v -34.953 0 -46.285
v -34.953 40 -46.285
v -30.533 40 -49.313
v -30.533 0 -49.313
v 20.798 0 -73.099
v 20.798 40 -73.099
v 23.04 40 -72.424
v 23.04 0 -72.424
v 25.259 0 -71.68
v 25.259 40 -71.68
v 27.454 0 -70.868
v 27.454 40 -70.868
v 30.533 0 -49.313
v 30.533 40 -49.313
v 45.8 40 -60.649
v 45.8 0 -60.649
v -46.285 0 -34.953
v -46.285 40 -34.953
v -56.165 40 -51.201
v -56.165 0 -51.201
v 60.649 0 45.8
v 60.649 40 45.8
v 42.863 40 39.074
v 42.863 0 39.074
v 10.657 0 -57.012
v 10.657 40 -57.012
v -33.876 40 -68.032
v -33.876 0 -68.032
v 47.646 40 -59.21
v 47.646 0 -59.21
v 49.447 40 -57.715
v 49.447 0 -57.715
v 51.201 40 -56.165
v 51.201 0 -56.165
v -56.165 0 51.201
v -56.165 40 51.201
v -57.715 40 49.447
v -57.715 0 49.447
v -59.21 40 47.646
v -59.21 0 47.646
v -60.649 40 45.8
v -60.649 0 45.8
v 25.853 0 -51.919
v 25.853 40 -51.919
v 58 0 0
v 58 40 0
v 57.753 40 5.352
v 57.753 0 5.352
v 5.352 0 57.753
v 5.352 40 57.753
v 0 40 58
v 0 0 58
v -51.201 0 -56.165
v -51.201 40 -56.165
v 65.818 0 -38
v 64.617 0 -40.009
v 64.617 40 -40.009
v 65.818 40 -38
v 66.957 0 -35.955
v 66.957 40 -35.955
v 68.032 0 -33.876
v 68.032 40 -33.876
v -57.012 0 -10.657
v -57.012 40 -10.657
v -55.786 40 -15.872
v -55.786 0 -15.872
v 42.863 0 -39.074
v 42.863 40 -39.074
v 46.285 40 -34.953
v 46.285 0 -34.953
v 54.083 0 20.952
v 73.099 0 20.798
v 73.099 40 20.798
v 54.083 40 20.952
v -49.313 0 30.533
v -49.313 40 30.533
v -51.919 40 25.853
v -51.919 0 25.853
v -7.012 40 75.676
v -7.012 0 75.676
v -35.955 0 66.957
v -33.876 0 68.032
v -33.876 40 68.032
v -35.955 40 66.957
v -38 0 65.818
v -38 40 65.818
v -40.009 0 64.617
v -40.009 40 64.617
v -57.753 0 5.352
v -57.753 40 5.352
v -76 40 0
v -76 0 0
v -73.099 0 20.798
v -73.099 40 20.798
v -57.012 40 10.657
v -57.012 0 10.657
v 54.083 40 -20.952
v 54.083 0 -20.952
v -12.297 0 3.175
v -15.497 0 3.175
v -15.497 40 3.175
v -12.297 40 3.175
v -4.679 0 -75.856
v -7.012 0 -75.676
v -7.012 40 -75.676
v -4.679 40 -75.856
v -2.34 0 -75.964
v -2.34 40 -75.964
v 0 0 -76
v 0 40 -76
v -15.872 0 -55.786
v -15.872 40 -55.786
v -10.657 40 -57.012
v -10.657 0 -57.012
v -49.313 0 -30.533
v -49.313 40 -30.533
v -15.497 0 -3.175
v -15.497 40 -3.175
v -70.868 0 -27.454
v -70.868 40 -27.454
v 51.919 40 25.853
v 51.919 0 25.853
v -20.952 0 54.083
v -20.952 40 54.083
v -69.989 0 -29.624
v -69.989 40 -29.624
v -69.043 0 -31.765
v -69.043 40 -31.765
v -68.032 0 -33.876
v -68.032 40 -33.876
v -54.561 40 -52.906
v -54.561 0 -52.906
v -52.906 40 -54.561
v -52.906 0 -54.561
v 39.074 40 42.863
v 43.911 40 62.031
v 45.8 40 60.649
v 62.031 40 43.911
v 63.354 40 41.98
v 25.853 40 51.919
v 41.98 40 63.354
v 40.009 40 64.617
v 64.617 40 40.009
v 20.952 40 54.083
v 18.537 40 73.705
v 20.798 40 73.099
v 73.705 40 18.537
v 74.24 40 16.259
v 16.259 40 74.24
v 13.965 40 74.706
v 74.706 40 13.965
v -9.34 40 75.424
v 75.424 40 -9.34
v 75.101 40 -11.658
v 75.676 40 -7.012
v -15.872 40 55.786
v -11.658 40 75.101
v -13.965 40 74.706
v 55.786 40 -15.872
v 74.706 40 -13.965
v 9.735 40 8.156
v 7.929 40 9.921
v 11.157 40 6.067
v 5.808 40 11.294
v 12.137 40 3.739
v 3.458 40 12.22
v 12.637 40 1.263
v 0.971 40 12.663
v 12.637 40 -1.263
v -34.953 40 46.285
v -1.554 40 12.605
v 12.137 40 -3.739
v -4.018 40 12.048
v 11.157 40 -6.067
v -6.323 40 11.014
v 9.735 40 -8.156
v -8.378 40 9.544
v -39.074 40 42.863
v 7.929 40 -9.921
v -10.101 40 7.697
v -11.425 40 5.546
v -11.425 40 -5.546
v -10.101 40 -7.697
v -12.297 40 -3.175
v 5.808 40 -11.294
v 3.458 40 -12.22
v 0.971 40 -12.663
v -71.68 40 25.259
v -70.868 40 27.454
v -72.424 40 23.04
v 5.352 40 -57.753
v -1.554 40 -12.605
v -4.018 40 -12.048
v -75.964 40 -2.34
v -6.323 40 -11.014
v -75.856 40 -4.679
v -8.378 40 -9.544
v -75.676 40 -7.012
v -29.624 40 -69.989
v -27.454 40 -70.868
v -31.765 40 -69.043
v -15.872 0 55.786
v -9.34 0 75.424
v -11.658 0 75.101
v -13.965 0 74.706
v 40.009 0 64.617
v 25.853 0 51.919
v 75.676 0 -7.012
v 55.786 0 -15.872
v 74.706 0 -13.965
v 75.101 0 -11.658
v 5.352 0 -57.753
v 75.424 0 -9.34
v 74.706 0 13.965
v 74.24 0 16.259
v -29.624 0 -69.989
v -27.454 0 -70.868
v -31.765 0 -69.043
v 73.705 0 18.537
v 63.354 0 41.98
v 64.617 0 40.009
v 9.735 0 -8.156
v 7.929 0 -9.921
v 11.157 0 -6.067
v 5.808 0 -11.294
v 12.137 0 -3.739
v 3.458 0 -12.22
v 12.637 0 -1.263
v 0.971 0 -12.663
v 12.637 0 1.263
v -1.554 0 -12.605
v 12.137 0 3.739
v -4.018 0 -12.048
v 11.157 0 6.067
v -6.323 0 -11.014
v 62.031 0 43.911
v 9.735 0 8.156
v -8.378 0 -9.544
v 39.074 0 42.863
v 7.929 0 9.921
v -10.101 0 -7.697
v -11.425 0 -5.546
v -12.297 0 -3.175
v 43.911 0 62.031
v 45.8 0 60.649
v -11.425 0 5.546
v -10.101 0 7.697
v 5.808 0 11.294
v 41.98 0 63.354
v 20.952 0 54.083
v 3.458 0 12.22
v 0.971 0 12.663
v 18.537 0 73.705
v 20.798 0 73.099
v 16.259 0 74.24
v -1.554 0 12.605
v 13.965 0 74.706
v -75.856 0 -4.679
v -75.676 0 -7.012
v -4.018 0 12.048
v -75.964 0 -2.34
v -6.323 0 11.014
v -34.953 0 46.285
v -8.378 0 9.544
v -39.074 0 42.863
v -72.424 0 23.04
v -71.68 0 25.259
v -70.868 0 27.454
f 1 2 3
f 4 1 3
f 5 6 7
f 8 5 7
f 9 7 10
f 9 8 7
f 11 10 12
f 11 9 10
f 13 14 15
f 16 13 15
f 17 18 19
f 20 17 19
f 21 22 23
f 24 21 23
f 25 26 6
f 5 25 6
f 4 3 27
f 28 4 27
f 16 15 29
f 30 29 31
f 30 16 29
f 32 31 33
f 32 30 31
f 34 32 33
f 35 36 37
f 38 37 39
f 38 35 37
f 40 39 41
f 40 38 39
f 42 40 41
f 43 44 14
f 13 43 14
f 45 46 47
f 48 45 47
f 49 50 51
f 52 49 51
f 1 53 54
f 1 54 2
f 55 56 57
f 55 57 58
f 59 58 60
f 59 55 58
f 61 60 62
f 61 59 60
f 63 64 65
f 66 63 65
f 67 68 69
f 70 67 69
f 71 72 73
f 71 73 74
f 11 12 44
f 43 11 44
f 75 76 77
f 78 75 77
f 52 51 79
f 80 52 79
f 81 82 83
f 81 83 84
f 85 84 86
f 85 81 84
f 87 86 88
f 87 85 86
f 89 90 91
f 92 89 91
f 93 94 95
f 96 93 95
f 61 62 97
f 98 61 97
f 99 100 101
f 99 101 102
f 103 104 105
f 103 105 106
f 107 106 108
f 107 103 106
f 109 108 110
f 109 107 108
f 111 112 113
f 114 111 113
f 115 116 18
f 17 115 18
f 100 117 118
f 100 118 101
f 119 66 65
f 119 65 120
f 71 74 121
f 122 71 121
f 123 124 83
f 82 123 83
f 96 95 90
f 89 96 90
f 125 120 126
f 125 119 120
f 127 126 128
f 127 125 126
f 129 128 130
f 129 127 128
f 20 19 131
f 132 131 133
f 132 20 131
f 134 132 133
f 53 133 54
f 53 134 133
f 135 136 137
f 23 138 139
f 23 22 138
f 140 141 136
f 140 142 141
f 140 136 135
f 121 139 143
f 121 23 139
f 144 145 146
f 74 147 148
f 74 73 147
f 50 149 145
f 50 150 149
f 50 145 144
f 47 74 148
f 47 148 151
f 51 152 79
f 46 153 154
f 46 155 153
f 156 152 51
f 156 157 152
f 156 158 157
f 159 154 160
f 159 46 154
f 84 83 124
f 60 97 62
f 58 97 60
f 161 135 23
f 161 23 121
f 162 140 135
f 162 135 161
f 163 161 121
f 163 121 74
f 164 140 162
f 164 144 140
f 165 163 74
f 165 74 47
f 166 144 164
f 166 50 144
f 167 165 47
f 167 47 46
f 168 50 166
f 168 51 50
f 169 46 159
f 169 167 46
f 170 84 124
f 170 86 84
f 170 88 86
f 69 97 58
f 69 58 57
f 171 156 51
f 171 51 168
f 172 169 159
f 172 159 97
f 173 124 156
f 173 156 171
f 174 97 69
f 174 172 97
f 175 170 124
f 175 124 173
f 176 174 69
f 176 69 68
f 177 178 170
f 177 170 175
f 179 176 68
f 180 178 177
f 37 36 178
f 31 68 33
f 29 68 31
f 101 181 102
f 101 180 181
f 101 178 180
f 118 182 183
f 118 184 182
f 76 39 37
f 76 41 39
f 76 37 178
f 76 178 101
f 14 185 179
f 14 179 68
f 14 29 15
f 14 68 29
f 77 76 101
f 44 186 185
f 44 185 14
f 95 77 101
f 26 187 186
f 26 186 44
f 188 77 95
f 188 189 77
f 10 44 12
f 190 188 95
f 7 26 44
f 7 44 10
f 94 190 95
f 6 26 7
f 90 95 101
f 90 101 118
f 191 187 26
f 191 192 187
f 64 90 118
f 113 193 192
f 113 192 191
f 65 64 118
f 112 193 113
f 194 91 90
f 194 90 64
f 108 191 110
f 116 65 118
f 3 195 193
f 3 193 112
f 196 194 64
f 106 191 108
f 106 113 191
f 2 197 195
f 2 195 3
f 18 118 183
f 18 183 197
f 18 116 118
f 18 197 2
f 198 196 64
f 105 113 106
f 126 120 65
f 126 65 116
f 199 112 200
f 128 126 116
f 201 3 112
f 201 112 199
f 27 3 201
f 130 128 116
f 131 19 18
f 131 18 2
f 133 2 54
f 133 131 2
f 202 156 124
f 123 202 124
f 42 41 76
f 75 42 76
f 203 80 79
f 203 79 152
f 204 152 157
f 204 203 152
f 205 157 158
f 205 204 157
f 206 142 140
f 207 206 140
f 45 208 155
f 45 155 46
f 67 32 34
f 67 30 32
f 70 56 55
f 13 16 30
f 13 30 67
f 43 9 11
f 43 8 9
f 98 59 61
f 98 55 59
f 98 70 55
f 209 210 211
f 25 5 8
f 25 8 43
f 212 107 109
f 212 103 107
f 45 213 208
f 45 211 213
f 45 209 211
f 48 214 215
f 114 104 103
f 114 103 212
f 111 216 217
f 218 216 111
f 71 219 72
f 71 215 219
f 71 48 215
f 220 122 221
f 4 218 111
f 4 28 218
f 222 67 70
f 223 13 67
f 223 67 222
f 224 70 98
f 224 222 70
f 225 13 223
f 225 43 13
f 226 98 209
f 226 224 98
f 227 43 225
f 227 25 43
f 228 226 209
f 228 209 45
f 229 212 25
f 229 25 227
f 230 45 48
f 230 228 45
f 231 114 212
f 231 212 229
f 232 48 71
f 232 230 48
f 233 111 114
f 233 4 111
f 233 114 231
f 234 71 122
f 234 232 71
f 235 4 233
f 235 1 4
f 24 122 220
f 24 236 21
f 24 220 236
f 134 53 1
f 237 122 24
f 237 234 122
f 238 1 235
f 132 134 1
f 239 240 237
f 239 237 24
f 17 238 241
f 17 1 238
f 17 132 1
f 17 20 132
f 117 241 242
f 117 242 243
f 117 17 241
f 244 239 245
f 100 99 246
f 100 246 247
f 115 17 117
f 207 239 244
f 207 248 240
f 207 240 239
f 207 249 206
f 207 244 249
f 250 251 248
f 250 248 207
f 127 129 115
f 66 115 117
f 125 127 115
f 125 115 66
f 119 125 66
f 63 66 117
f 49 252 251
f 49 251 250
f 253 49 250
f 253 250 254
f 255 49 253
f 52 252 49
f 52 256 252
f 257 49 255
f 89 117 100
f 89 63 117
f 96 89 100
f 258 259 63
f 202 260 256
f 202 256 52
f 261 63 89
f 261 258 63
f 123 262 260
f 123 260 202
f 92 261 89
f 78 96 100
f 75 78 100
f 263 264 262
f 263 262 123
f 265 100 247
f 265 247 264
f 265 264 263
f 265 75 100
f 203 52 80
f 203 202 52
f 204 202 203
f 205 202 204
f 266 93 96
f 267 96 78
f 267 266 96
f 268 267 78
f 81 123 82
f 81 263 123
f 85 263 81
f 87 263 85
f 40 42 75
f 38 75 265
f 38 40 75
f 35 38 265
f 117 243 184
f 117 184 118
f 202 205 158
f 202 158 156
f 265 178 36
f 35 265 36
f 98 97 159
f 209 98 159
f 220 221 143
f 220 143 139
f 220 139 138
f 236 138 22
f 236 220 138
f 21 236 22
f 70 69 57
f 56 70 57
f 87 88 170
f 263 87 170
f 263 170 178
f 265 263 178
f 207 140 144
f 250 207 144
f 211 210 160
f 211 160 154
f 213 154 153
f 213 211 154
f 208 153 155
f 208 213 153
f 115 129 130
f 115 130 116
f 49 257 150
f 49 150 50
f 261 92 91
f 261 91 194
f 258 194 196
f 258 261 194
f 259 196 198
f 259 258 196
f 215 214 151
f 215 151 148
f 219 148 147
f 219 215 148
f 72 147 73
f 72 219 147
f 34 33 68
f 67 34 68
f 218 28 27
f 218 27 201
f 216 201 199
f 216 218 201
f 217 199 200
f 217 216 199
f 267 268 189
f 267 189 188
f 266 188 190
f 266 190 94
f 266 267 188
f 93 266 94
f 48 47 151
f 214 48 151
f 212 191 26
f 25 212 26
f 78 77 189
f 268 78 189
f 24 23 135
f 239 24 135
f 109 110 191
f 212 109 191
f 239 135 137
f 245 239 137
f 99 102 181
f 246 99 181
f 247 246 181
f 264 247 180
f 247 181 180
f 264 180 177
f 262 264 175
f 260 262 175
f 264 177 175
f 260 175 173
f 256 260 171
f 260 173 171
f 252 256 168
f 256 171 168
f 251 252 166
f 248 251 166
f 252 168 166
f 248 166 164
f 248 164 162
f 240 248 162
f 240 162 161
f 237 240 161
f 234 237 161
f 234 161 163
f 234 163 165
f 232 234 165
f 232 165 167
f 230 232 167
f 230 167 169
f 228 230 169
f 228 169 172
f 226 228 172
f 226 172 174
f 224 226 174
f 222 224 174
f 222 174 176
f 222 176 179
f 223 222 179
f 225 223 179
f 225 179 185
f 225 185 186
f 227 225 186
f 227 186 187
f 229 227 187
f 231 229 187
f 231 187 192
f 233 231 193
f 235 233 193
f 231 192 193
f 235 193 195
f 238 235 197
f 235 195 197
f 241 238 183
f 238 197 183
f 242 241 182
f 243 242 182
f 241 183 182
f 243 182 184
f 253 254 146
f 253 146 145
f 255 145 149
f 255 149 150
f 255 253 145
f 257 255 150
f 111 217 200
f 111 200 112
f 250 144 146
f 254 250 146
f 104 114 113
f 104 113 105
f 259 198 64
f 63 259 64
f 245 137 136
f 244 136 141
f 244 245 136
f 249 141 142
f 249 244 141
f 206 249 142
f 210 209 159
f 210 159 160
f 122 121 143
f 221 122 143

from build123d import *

# Parameters (mm, degrees)
ENL_V_MAT_EXTRU_3_DEPTH      = 115.682169495
R_P_TITION_CIRCULAIRE1_COUNT = 17
ENL_V_MAT_EXTRU_4_DEPTH      = 115.682169495


with BuildPart() as part:
    # Esquisse1 → Révolution1 (revolve)
    with BuildSketch(Plane.XY, mode=Mode.PRIVATE) as r_volution1_sk:
        Polygon((-76, 40), (-76, 0), (-50, 0), (0, 0), (0, 40), (-50, 40), align=None)
    revolve(r_volution1_sk.sketch.rotate(Axis((0, 40, 0), (0, -1, 0)), 270), axis=Axis((0, 40, 0), (0, -1, 0)))

    # Esquisse5 → Enlèv. mat.-Extru.3 (cut, through all)
    with BuildSketch(Plane(origin=(0, 40, 0), x_dir=(1, 0, 0), z_dir=(0, 1, 0))):
        with BuildLine():
            ThreePointArc((-7.01239532, 75.675797398), (-17.400241796, 73.981292131), (-27.45436663, 70.867889435))
            Line((-27.45436663, 70.867889435), (-15.872453425, 55.785887304))
            Line((-15.872453425, 55.785887304), (-10.657472034, 57.012439782))
            Line((-10.657472034, 57.012439782), (-7.01239532, 75.675797398))
        make_face()
    enl_v_mat_extru_3 = extrude(amount=-ENL_V_MAT_EXTRU_3_DEPTH, mode=Mode.SUBTRACT)

    # Répétition circulaire1: Enlèv. mat.-Extru.3 ×17 about axis
    r_p_tition_circulaire1_axis = Axis((0, 0, 0), (0, 1, 0))
    for i in range(1, R_P_TITION_CIRCULAIRE1_COUNT):
        add(enl_v_mat_extru_3.rotate(r_p_tition_circulaire1_axis, i * 360 / R_P_TITION_CIRCULAIRE1_COUNT), mode=Mode.SUBTRACT)

    # Esquisse6 → Enlèv. mat.-Extru.4 (cut, through all)
    with BuildSketch(Plane(origin=(0, 40, 0), x_dir=(1, 0, 0), z_dir=(0, 1, 0))):
        with BuildLine():
            Line((-12.296722124, 3.175), (-15.496722124, 3.175))
            Line((-15.496722124, 3.175), (-15.496722124, -3.175))
            Line((-15.496722124, -3.175), (-12.296722124, -3.175))
            ThreePointArc((-12.296722124, -3.175), (12.7, 0), (-12.296722124, 3.175))
        make_face()
    extrude(amount=-ENL_V_MAT_EXTRU_4_DEPTH, mode=Mode.SUBTRACT)


solid = part.part
